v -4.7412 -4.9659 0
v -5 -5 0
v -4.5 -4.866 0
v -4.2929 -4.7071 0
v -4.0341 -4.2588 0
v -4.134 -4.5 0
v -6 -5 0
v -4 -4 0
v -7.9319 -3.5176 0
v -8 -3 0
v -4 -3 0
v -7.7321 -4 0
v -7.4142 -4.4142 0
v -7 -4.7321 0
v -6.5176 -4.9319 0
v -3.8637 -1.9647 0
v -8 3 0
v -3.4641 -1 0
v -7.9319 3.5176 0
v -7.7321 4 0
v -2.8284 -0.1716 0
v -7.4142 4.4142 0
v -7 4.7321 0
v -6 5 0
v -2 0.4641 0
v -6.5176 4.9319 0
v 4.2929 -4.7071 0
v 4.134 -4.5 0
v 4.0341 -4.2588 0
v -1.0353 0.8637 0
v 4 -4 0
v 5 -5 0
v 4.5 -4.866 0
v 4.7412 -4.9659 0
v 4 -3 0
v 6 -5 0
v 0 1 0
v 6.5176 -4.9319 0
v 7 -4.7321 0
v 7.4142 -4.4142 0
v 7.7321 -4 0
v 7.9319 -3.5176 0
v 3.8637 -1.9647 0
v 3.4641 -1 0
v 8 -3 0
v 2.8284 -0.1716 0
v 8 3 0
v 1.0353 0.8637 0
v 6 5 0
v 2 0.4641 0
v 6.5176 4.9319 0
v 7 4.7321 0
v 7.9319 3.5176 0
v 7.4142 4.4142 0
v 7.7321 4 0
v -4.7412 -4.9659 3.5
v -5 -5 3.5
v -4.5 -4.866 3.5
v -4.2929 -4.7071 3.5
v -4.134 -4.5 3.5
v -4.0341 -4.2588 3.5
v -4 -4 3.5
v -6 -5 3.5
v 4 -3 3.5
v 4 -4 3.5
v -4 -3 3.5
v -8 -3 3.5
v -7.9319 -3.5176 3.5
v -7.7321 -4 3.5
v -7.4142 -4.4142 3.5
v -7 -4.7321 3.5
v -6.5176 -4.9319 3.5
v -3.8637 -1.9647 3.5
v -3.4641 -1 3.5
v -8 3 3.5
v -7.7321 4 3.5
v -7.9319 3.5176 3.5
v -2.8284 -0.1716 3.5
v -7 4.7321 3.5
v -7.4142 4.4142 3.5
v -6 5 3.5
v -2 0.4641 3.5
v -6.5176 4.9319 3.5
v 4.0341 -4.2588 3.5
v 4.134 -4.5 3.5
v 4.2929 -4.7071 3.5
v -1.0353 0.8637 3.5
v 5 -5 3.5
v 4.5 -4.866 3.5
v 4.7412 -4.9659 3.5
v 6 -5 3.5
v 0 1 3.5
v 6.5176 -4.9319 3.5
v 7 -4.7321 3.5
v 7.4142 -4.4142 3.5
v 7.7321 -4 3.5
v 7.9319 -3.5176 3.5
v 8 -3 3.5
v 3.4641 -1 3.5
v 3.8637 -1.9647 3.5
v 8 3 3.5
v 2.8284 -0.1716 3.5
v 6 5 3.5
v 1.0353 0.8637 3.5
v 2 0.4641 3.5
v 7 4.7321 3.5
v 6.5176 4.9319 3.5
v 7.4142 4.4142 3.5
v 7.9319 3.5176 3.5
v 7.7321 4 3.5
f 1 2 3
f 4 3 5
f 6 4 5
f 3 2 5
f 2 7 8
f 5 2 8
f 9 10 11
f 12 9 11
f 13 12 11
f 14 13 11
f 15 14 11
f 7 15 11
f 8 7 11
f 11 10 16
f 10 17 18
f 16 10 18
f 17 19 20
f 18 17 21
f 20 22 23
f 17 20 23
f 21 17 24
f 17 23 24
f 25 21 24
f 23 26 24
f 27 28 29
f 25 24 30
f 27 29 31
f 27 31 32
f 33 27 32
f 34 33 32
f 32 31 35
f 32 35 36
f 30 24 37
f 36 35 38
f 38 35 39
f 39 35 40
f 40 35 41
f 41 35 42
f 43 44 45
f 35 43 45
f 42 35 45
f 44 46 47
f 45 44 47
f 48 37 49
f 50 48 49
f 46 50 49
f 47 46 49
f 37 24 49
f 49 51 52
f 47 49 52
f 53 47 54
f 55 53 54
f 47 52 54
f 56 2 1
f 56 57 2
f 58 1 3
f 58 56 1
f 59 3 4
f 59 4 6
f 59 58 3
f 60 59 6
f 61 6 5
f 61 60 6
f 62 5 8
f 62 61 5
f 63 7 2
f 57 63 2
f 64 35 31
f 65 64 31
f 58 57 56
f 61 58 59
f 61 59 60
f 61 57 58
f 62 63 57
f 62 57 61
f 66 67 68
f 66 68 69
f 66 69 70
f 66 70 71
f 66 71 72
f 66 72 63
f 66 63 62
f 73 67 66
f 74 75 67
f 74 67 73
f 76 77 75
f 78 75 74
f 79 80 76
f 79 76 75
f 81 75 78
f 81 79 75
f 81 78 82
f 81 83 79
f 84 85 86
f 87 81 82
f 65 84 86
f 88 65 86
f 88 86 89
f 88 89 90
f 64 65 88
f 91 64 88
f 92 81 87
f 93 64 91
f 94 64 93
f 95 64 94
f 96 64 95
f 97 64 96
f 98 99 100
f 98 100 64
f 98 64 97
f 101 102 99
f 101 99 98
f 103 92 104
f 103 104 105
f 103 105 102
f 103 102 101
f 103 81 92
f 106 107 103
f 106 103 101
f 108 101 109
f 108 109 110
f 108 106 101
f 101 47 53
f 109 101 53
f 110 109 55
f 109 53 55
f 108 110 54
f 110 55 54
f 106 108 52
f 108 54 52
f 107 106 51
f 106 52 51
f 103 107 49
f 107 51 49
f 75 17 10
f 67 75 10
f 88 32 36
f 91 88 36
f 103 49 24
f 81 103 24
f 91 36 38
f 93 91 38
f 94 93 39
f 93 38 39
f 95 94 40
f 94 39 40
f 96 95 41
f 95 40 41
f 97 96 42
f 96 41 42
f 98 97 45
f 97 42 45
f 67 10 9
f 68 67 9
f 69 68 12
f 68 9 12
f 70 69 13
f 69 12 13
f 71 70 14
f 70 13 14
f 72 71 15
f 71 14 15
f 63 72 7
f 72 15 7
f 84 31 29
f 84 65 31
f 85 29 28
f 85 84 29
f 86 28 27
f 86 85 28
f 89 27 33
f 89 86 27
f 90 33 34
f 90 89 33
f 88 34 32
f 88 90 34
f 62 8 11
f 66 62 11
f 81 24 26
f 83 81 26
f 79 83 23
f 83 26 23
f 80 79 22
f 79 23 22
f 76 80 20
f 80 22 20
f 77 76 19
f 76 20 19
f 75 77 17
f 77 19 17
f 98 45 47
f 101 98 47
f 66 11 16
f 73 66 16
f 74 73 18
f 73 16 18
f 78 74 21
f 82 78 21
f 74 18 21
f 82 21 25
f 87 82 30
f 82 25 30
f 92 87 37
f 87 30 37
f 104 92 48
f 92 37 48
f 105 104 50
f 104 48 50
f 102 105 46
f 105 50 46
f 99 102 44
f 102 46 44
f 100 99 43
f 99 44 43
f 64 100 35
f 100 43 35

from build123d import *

# Parameters (mm, degrees)
BOSS_EXTRUDE1_DEPTH = 3.5
FILLET1_R           = 1


with BuildPart() as part:
    # Sketch1 → Boss-Extrude1 (new body)
    with BuildSketch(Plane.XY):
        with BuildLine():
            Line((-6, -5), (-4, -5))
            Line((-4, -5), (-4, -3))
            ThreePointArc((-4, -3), (0, 1), (4, -3))
            Line((4, -3), (4, -5))
            Line((4, -5), (6, -5))
            ThreePointArc((6, -5), (7.414213562, -4.414213562), (8, -3))
            Line((8, -3), (8, 3))
            ThreePointArc((8, 3), (7.414213562, 4.414213562), (6, 5))
            Line((6, 5), (-6, 5))
            ThreePointArc((-6, 5), (-7.414213562, 4.414213562), (-8, 3))
            Line((-8, 3), (-8, -3))
            ThreePointArc((-8, -3), (-7.414213562, -4.414213562), (-6, -5))
        make_face()
    extrude(amount=BOSS_EXTRUDE1_DEPTH)

    # Fillet1
    fillet1_edges = [part.edges().sort_by_distance(p)[0] for p in [
        (-4, -5, 1.75),
        (4, -5, 1.75),
    ]]
    fillet(fillet1_edges, radius=FILLET1_R)


solid = part.part
